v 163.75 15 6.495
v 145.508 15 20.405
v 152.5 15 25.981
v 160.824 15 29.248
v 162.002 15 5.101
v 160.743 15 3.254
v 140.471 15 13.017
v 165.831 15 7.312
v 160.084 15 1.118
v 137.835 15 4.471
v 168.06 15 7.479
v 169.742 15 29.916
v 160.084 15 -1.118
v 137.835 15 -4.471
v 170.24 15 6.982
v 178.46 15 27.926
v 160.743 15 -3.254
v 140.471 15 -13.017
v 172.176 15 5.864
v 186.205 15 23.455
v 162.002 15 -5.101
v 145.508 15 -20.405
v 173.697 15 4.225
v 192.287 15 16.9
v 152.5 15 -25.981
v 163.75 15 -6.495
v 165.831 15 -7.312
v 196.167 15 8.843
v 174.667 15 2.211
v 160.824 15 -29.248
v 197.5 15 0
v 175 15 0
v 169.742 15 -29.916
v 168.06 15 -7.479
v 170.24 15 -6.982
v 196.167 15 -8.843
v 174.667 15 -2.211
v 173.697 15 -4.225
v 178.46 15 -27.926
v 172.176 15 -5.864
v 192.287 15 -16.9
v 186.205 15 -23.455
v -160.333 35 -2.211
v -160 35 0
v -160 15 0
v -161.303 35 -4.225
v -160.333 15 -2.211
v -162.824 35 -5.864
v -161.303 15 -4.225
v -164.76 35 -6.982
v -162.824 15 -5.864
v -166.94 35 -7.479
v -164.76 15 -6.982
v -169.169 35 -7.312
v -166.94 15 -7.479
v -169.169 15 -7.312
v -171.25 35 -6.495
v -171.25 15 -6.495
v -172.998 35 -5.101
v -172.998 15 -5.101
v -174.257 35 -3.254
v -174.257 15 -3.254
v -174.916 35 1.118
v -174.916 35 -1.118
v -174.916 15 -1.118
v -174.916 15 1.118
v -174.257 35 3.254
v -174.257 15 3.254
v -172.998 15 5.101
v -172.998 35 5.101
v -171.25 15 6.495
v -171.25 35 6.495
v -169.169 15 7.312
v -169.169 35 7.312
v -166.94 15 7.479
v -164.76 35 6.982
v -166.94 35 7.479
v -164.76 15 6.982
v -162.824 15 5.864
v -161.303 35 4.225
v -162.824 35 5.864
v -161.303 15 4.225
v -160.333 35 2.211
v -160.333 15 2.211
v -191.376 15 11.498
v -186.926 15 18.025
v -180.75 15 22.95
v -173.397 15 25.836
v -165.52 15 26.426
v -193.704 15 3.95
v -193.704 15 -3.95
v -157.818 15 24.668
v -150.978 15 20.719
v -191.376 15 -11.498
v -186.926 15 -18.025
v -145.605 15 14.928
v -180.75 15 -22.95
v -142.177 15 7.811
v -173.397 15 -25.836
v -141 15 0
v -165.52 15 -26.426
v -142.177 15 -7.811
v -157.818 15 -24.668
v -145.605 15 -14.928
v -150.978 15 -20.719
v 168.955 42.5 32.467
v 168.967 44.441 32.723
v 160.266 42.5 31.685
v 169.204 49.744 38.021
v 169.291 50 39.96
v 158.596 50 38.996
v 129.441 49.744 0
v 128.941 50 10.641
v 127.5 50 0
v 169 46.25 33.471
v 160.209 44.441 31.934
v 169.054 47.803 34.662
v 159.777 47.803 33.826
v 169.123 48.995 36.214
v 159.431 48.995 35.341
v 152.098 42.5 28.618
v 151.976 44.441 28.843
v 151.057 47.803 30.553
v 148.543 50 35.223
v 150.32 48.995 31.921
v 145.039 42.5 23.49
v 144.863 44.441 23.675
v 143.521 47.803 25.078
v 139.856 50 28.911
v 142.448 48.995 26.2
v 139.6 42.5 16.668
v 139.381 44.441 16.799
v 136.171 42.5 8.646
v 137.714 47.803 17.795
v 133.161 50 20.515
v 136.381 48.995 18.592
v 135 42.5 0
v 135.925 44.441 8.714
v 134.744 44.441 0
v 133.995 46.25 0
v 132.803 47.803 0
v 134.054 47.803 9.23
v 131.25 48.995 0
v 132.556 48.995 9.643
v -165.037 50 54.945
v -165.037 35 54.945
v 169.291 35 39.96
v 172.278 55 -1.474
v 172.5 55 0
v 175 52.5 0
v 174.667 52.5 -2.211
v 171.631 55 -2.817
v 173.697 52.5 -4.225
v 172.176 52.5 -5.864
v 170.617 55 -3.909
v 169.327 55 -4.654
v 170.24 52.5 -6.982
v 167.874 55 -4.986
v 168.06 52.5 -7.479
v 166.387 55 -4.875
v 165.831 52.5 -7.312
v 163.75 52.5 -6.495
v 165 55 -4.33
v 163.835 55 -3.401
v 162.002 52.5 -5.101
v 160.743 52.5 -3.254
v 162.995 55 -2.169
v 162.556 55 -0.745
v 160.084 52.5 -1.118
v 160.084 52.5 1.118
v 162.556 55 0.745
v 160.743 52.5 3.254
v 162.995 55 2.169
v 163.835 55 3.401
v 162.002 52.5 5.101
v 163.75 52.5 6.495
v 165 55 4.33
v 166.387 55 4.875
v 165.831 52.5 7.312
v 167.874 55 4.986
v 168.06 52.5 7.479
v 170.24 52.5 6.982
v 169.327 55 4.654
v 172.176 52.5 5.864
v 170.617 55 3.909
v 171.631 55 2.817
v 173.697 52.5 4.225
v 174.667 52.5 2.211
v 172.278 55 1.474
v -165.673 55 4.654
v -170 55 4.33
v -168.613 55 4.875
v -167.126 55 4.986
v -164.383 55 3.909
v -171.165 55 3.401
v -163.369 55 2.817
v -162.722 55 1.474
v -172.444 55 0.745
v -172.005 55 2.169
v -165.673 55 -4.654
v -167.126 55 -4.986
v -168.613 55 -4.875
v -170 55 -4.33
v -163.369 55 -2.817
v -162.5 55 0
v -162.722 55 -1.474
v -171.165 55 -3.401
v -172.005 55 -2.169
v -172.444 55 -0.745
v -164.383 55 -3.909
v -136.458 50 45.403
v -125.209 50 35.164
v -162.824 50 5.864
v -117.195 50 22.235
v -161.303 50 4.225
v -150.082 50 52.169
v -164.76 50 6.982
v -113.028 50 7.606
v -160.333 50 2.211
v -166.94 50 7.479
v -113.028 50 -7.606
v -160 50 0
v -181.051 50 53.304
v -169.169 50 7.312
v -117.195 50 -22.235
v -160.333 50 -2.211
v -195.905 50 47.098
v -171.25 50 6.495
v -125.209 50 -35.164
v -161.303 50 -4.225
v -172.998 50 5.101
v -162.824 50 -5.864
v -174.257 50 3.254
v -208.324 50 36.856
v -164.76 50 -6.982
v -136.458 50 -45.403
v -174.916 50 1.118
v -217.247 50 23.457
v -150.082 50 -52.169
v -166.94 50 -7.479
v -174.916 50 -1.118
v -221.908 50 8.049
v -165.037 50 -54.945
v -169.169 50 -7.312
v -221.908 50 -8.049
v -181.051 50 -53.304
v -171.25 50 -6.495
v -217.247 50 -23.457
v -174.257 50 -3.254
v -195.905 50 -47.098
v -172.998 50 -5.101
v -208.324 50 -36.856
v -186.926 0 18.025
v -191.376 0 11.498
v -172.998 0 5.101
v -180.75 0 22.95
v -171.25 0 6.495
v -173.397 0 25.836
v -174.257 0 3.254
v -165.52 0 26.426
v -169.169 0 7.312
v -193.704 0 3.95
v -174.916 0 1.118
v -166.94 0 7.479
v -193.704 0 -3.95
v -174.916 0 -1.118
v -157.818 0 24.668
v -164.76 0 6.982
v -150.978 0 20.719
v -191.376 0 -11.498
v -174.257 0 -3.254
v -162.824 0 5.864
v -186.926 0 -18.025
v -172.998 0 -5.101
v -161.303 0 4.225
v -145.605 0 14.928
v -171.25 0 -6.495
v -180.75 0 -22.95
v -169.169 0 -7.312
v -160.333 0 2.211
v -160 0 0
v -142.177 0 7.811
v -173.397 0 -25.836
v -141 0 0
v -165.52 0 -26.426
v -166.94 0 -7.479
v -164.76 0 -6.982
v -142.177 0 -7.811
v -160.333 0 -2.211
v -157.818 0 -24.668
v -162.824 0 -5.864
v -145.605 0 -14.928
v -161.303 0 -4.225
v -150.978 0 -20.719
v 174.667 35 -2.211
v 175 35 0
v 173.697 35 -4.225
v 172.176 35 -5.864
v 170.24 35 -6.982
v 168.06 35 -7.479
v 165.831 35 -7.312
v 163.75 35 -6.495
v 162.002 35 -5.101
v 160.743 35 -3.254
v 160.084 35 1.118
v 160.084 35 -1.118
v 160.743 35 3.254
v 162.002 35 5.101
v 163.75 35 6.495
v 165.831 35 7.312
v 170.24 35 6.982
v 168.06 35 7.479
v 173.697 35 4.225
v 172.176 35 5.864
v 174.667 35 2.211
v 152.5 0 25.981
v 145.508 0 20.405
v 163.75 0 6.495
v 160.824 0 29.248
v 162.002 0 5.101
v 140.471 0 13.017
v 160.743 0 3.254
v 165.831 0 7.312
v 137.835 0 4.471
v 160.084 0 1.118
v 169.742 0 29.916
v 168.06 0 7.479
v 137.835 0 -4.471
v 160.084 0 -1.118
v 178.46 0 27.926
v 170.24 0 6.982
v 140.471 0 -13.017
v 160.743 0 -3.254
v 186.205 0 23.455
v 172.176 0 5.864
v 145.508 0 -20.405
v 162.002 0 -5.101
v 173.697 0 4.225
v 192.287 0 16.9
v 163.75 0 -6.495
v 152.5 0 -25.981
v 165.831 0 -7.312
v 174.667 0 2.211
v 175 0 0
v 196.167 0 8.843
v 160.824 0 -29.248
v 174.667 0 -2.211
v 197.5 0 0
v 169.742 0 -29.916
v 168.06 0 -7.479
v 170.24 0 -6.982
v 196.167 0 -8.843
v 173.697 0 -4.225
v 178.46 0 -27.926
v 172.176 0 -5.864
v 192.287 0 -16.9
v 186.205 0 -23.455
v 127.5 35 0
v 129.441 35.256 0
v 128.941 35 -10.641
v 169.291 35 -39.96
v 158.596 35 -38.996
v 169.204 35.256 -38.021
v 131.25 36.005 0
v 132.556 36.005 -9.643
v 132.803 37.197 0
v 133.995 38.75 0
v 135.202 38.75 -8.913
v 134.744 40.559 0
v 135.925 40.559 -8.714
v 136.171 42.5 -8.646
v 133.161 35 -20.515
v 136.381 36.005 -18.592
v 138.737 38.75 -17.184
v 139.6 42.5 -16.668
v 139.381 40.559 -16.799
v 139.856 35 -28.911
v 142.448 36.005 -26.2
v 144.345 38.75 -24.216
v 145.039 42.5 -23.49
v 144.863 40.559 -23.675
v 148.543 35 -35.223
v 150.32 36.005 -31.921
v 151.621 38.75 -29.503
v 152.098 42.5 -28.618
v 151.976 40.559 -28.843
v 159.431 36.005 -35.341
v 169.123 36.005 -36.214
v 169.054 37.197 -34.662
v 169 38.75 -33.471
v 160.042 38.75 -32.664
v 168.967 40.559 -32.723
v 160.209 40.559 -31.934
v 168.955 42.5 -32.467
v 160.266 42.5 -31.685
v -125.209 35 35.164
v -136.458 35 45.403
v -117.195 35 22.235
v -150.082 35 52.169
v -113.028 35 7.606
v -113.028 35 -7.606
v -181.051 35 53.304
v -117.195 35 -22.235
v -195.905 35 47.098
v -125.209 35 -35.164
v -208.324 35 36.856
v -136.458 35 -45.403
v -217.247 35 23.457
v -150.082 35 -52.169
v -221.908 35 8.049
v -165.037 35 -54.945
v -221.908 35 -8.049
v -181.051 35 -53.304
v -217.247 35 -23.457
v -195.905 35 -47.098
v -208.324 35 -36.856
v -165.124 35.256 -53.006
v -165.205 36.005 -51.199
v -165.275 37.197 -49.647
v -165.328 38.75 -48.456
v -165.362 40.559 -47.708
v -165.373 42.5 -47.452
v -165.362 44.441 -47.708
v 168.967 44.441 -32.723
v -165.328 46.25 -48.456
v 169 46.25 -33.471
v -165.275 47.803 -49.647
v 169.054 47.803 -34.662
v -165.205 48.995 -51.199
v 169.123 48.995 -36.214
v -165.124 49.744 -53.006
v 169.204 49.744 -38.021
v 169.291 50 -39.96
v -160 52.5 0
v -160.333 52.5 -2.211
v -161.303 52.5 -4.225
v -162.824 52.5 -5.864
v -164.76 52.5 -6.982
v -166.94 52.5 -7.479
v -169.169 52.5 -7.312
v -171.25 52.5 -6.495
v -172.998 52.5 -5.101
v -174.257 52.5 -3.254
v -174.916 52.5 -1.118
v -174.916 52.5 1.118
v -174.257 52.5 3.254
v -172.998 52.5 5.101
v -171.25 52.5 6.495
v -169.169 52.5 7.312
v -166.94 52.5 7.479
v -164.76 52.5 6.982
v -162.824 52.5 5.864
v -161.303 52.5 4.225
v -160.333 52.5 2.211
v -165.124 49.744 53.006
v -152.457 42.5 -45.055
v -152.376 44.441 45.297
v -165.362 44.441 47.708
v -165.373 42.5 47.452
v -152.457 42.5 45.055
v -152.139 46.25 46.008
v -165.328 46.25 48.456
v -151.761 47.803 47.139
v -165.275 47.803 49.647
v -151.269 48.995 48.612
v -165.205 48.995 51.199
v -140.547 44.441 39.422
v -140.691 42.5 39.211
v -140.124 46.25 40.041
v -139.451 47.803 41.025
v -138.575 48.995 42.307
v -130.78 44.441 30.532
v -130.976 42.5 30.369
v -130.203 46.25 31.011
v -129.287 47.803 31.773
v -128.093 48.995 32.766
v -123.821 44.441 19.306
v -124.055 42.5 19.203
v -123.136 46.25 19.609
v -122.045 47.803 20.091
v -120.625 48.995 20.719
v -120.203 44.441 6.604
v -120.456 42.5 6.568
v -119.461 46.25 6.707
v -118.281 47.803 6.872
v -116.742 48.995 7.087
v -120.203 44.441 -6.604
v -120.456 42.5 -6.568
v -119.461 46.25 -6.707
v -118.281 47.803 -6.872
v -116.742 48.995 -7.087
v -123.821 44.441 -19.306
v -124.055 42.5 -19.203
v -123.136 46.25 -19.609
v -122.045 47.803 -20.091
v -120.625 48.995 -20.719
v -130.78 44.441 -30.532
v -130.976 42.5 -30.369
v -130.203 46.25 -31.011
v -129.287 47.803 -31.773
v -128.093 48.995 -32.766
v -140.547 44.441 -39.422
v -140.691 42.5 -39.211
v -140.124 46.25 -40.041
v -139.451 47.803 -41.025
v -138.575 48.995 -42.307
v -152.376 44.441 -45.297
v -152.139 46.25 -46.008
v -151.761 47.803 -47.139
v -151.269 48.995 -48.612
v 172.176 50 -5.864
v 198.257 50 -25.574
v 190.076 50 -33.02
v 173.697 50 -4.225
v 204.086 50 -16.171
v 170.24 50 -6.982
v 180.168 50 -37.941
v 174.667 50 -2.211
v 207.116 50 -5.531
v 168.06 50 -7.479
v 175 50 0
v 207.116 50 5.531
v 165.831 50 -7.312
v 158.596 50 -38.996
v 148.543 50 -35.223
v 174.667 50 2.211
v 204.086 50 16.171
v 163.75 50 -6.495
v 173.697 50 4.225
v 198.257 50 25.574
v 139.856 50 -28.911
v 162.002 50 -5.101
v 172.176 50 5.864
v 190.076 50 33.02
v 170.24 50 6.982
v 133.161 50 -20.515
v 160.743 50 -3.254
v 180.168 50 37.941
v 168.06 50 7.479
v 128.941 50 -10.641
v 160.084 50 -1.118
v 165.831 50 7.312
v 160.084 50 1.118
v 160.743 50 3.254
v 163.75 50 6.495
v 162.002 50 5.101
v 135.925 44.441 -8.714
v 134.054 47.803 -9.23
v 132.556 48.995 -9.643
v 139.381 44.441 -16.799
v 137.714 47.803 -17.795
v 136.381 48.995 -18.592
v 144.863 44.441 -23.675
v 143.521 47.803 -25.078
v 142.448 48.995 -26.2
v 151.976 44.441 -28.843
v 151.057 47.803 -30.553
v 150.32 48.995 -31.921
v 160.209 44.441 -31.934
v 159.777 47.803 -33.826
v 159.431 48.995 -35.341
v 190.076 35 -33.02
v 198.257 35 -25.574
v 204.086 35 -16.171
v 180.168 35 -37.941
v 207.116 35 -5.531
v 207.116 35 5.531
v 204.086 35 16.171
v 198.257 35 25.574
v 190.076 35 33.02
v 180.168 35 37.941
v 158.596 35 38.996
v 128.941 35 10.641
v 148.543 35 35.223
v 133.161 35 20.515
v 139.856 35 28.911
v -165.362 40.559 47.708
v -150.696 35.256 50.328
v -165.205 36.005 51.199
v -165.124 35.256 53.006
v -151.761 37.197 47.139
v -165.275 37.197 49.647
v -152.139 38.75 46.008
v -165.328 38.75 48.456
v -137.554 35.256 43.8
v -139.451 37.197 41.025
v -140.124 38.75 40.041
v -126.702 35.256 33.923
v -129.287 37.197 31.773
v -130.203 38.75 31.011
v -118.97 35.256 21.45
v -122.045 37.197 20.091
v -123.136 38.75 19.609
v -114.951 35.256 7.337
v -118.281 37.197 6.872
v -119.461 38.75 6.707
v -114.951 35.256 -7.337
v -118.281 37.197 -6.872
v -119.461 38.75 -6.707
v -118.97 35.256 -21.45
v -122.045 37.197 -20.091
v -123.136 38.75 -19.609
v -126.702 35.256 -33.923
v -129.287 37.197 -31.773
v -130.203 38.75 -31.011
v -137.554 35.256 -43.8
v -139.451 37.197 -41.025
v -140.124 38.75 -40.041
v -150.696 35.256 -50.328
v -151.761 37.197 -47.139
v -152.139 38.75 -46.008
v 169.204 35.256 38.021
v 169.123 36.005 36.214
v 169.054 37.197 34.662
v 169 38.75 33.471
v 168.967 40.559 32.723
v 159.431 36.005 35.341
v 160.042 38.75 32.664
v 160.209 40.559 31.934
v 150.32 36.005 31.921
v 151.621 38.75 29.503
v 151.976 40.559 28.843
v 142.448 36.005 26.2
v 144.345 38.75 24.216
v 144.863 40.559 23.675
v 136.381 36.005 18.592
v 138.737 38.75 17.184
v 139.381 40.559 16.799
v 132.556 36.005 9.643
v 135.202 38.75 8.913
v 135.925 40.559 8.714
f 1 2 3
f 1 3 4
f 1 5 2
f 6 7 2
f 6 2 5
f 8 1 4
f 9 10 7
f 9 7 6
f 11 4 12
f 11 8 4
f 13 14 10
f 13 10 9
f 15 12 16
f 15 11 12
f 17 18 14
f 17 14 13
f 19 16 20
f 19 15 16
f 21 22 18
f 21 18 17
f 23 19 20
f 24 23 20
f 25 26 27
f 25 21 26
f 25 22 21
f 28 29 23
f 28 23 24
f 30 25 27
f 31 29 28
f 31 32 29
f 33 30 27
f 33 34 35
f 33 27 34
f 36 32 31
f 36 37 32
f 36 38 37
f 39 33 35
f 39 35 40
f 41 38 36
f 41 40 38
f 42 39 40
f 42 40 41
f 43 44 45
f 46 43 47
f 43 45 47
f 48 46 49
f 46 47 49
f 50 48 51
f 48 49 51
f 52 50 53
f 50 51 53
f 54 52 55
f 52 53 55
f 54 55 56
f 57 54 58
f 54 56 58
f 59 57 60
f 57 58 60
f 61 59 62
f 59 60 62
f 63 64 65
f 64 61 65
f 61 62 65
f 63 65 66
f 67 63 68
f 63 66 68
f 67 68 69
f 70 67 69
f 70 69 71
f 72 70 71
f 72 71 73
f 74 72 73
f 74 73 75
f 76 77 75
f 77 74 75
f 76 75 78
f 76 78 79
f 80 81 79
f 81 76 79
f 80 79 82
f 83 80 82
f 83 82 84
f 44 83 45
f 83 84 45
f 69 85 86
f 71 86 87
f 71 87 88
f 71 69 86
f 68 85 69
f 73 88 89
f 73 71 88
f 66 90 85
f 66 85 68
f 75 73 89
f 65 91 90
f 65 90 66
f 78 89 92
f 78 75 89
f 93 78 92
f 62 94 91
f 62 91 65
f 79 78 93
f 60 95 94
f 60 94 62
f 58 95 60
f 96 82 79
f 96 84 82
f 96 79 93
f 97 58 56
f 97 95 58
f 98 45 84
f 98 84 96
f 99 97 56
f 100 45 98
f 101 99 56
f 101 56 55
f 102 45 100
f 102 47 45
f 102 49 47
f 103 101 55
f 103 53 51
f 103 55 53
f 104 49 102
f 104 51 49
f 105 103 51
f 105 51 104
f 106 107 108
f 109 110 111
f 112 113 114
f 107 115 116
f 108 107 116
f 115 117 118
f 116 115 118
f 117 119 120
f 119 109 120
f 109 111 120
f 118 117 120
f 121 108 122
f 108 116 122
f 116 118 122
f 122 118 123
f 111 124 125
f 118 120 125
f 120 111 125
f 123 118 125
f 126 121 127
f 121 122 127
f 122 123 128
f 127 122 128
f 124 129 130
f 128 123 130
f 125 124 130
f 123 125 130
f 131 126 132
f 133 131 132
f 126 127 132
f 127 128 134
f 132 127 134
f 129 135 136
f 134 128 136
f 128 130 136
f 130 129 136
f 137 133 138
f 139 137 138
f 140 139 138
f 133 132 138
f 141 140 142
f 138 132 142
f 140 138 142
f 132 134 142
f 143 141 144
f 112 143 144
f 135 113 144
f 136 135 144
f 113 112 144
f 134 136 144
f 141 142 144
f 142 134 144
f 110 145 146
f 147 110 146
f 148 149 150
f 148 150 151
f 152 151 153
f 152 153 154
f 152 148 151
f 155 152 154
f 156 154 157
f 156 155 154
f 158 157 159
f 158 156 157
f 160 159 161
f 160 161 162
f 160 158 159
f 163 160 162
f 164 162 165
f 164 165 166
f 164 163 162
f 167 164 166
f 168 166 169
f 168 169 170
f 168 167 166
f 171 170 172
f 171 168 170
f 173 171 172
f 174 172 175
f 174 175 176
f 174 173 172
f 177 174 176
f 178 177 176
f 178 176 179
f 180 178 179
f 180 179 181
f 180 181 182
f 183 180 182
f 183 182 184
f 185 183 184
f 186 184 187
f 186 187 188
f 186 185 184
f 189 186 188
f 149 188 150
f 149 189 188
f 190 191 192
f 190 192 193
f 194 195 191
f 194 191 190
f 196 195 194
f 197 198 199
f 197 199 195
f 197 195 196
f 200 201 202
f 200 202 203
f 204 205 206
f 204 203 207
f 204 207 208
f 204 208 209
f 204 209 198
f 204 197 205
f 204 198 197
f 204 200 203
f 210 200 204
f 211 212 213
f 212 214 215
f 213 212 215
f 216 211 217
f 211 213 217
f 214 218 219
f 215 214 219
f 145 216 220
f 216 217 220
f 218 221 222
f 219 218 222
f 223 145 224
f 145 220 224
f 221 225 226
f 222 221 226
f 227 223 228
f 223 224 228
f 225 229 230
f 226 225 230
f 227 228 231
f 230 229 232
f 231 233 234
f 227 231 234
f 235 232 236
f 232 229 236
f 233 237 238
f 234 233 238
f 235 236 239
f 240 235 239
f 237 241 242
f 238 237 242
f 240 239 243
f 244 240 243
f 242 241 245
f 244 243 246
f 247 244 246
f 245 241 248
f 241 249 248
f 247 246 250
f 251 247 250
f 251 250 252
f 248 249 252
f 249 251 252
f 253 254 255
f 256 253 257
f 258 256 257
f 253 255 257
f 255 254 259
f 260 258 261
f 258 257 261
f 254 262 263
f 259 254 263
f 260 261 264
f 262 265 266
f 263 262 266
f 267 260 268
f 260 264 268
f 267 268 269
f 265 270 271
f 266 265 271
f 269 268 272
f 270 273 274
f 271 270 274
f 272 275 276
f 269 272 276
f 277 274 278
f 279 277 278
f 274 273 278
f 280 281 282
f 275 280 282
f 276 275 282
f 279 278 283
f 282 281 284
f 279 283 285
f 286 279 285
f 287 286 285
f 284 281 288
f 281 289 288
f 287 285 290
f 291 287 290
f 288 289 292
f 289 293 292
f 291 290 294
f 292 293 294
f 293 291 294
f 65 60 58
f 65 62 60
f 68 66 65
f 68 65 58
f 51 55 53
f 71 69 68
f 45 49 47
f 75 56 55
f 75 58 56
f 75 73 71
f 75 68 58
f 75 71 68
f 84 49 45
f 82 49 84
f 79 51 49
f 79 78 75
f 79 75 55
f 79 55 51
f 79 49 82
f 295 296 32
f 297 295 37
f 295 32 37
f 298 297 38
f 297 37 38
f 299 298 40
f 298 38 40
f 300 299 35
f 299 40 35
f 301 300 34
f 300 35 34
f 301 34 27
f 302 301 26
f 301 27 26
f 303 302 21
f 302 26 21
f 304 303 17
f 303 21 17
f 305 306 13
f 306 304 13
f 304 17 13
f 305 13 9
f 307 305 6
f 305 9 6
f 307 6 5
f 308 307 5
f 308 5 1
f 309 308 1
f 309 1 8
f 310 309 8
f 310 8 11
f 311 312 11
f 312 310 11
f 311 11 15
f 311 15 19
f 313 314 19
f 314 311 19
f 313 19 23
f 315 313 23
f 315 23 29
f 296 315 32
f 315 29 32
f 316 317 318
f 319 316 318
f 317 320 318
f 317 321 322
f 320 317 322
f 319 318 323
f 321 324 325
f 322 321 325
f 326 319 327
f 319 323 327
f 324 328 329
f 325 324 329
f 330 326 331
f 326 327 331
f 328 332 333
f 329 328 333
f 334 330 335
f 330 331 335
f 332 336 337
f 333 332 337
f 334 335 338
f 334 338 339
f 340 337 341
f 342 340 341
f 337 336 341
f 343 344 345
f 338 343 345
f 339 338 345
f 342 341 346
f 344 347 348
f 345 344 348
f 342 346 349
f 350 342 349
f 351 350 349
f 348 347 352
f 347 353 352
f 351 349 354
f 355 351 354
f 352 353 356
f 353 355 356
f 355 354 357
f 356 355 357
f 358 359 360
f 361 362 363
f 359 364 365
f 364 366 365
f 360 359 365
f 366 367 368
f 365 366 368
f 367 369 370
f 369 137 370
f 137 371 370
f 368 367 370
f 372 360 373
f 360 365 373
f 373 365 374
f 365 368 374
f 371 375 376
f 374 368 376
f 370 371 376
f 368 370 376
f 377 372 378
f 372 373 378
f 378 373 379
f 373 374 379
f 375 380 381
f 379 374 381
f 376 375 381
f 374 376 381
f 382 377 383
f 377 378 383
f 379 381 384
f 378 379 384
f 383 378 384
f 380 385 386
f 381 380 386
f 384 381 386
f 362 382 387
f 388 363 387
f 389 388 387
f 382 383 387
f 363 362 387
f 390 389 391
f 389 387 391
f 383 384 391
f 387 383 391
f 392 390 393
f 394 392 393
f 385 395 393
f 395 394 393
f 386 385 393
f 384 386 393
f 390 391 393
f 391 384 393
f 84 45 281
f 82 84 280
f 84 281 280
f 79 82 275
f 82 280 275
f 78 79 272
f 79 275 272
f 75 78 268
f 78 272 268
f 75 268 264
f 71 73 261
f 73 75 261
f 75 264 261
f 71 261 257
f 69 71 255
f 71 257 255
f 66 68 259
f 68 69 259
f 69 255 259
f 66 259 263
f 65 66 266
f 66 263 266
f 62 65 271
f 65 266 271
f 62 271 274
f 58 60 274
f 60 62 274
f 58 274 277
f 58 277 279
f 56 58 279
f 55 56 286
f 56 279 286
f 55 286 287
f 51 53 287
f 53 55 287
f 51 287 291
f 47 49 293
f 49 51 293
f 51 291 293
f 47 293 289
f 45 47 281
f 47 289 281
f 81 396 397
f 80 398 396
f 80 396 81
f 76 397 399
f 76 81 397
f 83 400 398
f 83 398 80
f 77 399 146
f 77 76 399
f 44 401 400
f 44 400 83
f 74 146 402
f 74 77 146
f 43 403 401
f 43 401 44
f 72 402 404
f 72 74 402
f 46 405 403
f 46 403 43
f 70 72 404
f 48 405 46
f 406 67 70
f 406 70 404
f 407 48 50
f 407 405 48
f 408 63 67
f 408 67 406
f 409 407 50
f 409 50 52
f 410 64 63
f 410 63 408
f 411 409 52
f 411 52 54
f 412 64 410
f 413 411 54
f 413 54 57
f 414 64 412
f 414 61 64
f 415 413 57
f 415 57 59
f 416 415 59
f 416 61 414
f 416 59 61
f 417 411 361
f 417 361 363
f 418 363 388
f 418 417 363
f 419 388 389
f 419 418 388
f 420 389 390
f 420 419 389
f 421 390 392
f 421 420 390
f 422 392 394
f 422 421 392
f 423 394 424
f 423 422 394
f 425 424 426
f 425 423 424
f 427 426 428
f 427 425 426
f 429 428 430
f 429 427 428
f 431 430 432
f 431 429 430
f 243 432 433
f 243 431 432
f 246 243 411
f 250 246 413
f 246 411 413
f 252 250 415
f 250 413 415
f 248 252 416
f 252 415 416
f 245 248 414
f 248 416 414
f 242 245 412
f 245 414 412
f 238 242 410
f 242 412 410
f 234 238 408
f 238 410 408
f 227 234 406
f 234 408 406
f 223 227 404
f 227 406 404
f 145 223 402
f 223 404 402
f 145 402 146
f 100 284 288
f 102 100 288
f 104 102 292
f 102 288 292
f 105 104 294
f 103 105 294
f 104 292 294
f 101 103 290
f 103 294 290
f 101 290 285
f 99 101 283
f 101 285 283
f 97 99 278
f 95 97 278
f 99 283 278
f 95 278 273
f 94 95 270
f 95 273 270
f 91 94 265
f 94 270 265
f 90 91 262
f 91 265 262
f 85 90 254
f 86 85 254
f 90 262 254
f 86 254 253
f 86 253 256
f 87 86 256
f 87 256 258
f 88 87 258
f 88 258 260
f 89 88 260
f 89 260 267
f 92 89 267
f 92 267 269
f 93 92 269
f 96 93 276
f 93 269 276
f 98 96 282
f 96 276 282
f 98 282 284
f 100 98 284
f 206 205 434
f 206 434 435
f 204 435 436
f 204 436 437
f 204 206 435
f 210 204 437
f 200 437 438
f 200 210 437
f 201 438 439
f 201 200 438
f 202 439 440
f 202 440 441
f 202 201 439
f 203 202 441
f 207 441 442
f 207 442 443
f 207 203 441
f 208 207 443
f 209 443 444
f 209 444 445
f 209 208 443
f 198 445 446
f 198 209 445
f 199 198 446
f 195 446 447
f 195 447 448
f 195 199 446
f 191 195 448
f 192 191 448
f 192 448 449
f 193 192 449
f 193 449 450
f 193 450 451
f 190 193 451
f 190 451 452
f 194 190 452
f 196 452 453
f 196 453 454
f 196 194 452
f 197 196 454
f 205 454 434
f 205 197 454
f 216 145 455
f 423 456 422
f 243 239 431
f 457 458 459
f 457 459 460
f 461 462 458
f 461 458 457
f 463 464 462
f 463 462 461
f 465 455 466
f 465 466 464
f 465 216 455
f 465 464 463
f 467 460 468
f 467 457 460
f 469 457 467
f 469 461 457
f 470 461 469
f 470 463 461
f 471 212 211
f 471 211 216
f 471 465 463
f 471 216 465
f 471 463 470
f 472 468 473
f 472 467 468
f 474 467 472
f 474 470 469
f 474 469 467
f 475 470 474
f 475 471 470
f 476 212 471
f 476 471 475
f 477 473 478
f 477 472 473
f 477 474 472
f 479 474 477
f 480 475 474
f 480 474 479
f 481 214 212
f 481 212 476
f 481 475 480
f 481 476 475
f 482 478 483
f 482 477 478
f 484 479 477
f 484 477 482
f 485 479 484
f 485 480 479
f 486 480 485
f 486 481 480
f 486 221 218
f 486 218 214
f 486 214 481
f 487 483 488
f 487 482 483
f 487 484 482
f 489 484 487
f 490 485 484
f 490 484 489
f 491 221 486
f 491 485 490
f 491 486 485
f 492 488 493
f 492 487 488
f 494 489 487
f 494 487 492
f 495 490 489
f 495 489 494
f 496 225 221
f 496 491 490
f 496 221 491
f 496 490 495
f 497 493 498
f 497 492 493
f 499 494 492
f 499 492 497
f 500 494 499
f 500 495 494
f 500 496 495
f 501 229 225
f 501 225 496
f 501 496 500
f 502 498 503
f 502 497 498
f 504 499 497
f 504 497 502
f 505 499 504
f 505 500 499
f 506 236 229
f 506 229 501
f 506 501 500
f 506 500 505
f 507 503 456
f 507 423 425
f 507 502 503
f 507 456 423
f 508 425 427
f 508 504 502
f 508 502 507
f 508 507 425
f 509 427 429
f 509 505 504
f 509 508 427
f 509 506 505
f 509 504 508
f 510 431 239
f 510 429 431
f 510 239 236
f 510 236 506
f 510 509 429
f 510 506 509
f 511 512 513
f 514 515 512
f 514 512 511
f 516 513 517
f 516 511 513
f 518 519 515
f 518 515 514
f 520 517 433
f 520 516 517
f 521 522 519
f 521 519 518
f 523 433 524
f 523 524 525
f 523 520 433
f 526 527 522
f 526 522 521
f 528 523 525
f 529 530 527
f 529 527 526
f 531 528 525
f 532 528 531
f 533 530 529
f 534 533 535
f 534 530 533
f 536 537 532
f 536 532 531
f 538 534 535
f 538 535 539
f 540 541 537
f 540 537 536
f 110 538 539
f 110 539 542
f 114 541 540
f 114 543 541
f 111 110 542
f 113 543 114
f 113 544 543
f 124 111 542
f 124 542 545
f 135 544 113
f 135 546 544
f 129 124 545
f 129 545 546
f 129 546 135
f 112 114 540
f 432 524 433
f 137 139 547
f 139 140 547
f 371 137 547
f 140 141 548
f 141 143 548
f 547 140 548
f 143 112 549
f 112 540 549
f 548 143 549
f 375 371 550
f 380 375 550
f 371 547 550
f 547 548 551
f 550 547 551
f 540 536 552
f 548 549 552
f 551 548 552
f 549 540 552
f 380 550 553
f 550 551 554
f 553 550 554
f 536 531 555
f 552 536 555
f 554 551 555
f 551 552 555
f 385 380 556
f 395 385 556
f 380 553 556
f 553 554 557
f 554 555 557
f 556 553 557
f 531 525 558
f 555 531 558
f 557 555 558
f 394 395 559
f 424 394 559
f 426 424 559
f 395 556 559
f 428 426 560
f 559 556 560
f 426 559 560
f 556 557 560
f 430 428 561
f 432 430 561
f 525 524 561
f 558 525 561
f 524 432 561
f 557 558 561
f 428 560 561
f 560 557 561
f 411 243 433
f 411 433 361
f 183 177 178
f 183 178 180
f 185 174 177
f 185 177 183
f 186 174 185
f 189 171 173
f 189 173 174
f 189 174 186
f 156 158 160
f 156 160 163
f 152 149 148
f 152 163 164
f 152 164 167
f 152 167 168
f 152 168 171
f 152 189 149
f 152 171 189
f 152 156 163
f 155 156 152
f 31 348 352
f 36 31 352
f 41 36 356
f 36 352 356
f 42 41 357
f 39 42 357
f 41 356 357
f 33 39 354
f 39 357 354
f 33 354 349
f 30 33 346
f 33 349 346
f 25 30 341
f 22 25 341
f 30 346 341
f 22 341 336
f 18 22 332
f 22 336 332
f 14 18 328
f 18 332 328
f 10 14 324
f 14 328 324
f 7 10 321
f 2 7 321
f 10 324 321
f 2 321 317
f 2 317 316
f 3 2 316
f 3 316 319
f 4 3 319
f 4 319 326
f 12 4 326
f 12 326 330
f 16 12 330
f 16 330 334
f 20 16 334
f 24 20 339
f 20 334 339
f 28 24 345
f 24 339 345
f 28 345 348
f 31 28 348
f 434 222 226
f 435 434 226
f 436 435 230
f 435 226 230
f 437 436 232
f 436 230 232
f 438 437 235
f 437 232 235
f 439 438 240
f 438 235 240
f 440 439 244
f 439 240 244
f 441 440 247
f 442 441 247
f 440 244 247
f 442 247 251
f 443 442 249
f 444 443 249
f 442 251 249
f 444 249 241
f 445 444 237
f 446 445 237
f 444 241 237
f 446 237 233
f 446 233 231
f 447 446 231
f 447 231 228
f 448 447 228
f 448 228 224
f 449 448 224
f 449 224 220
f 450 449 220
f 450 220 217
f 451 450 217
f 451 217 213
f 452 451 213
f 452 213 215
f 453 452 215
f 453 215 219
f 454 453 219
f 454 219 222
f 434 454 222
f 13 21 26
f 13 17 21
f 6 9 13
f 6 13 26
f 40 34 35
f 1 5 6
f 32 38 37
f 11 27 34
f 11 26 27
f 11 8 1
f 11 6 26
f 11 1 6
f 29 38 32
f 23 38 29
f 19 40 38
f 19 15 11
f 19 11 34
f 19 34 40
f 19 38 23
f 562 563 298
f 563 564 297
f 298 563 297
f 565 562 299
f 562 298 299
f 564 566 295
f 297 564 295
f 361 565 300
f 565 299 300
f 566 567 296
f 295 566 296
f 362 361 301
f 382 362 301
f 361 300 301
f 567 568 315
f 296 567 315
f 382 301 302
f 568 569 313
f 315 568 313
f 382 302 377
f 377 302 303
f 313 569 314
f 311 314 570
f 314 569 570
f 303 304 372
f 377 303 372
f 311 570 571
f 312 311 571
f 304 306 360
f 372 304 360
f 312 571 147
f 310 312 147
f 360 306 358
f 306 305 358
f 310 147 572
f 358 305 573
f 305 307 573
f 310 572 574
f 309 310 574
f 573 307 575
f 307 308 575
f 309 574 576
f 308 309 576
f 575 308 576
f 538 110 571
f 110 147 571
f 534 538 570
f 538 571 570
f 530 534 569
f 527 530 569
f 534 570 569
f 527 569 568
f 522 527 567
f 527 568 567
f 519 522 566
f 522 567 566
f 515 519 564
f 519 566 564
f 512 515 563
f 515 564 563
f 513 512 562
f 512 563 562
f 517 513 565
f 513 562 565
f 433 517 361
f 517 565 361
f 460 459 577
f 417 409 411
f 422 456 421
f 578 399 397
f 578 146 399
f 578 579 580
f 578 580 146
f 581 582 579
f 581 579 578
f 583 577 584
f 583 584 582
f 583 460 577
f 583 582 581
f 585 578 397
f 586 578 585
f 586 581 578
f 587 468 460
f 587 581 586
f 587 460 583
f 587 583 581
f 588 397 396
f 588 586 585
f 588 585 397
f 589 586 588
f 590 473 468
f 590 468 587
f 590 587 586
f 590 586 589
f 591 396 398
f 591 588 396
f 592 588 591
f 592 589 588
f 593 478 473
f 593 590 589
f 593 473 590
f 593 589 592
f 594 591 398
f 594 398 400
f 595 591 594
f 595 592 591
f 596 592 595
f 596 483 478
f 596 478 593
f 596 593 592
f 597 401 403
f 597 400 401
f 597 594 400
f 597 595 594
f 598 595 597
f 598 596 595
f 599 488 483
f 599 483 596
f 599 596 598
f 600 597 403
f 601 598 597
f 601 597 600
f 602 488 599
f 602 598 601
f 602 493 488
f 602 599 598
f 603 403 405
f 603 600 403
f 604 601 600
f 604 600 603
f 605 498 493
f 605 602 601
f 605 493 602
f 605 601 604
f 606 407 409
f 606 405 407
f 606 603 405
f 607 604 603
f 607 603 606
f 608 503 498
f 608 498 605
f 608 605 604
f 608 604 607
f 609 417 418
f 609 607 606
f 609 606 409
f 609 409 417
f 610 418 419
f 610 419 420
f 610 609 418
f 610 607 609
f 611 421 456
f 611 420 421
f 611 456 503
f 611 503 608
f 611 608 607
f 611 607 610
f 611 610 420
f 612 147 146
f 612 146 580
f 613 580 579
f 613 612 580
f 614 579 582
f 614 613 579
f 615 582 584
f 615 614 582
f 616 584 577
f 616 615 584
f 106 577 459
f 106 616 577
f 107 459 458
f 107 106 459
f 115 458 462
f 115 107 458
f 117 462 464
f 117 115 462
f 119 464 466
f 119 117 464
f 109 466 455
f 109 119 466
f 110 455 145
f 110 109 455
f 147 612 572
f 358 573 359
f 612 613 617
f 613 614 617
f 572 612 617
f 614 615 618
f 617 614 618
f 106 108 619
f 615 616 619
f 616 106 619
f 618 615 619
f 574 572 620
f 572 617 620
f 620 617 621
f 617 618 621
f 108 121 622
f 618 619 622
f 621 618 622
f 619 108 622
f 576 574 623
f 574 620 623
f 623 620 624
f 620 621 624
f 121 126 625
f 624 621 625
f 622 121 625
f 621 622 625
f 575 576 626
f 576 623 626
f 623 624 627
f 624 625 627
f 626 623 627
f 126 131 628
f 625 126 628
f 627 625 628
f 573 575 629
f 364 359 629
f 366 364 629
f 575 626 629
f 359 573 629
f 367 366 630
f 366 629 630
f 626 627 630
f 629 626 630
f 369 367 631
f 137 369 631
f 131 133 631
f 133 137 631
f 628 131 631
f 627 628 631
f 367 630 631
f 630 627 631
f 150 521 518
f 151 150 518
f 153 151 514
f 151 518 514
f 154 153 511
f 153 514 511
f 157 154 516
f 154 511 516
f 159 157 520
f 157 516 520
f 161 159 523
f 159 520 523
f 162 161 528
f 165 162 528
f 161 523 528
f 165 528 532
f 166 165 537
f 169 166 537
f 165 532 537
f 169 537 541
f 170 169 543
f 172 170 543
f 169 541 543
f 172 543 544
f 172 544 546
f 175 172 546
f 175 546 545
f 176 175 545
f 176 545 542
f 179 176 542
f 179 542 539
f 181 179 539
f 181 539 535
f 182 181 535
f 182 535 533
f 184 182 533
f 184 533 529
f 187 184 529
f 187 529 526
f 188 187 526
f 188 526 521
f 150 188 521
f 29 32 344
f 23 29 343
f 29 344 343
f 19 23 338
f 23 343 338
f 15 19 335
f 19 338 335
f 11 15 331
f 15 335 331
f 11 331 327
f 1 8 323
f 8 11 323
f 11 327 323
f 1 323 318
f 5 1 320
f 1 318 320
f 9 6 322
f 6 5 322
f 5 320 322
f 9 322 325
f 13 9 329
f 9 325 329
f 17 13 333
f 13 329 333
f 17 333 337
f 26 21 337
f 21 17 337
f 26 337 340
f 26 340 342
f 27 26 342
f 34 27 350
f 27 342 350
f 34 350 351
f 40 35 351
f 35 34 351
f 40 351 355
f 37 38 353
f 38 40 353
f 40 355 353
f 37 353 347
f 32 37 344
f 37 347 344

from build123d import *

# Parameters (mm, degrees)
SKETCH1_R             = 30
BOSS_EXTRUDE1_DEPTH   = 15
SKETCH1_R_2           = 26.5
BOSS_EXTRUDE1_2_DEPTH = 15
SKETCH2_R             = 7.5
BOSS_EXTRUDE2_DEPTH   = 40
SKETCH4_W             = 55
SKETCH4_H             = 15
SKETCH5_R             = 7.5
SKETCH6_W             = 40
SKETCH6_H             = 15
SKETCH7_R             = 7.5
CHAMFER1_SIZE         = 2.5
SKETCH10_R            = 7.5
CUT_EXTRUDE1_DEPTH    = 15
SKETCH11_R            = 7.5
CUT_EXTRUDE2_DEPTH    = 15


with BuildPart() as part:
    # Sketch1 → Boss-Extrude1 (new body)
    with BuildSketch(Plane(origin=(0, 0, 0), x_dir=(1, 0, 0), z_dir=(0, 1, 0))):
        with Locations((167.5, 0)):
            Circle(SKETCH1_R)
    extrude(amount=BOSS_EXTRUDE1_DEPTH)



with BuildPart() as body_2:
    # Sketch1 → Boss-Extrude1 2 (new body)
    with BuildSketch(Plane(origin=(0, 0, 0), x_dir=(1, 0, 0), z_dir=(0, 1, 0))):
        with Locations((-167.5, 0)):
            Circle(SKETCH1_R_2)
    extrude(amount=BOSS_EXTRUDE1_2_DEPTH)


with BuildPart() as part_1:
    add(part.part)

    add(body_2.part)  # Boss-Extrude2 merges body 2
    # Sketch2 → Boss-Extrude2 (add)
    with BuildSketch(Plane(origin=(0, 15, 0), x_dir=(1, 0, 0), z_dir=(0, 1, 0))):
        with Locations((-167.5, 0)):
            Circle(SKETCH2_R)
        with Locations((167.5, 0)):
            Circle(SKETCH2_R)
    extrude(amount=BOSS_EXTRUDE2_DEPTH)

    # Sketch4 → Revolve3 (revolve)
    with BuildSketch(Plane.XY):
        with Locations((-195, 42.5)):
            Rectangle(SKETCH4_W, SKETCH4_H)
    revolve(axis=Axis((-167.5, 55, 0), (0, -1, 0)))

    # Sketch5 → Cut-Revolve1 (revolve, cut)
    with BuildSketch(Plane.XY):
        with Locations((-222.5, 42.5)):
            Circle(SKETCH5_R)
    revolve(axis=Axis((-167.5, 55, 0), (0, 1, 0)), mode=Mode.SUBTRACT)

    # Sketch6 → Revolve4 (revolve)
    with BuildSketch(Plane.XY):
        with Locations((147.5, 42.5)):
            Rectangle(SKETCH6_W, SKETCH6_H)
    revolve(axis=Axis((167.5, 55, 0), (0, 1, 0)))

    # Sketch7 → Cut-Revolve2 (revolve, cut)
    with BuildSketch(Plane.XY):
        with Locations((127.5, 42.5)):
            Circle(SKETCH7_R)
    revolve(axis=Axis((167.5, 55, 0), (0, -1, 0)), mode=Mode.SUBTRACT)

    # Sweep1: sweep along a path in Sketch8
    with BuildLine(Plane(origin=(0, 42.5, 0), x_dir=(1, 0, 0), z_dir=(0, 1, 0))) as sweep1_path:
        Line((168.955223881, 32.467404015), (-165.373134328, 47.452359714))
        ThreePointArc((-165.373134328, 47.452359714), (-215, 0), (-165.373134328, -47.452359714))
        Line((-165.373134328, -47.452359714), (168.955223881, -32.467404015))
        ThreePointArc((168.955223881, -32.467404015), (200, 0), (168.955223881, 32.467404015))
    # Sketch9 → Sweep1 (sweep)
    with BuildSketch(Plane(origin=(-165.373134328, 42.5, 47.452359714), x_dir=(-0.044776119, 0, -0.998997047), z_dir=(0.998997047, 0, -0.044776119))):
        with BuildLine():
            Line((-7.5, 7.5), (-7.5, -7.5))
            ThreePointArc((-7.5, -7.5), (0, 0), (-7.5, 7.5))
        make_face()
    sweep(path=sweep1_path.line)

    # Chamfer1
    chamfer1_edges = [part_1.edges().sort_by_distance(p)[0] for p in [
        (160, 55, 0),
        (-175, 55, 0),
    ]]
    chamfer(chamfer1_edges, length=CHAMFER1_SIZE)

    # Sketch10 → Cut-Extrude1 (cut)
    with BuildSketch(Plane.XZ):
        with Locations((-167.5, 0)):
            Circle(SKETCH10_R)
    extrude(amount=-CUT_EXTRUDE1_DEPTH, mode=Mode.SUBTRACT)

    # Sketch11 → Cut-Extrude2 (cut)
    with BuildSketch(Plane.XZ):
        with Locations((167.5, 0)):
            Circle(SKETCH11_R)
    extrude(amount=-CUT_EXTRUDE2_DEPTH, mode=Mode.SUBTRACT)


solid = part_1.part
